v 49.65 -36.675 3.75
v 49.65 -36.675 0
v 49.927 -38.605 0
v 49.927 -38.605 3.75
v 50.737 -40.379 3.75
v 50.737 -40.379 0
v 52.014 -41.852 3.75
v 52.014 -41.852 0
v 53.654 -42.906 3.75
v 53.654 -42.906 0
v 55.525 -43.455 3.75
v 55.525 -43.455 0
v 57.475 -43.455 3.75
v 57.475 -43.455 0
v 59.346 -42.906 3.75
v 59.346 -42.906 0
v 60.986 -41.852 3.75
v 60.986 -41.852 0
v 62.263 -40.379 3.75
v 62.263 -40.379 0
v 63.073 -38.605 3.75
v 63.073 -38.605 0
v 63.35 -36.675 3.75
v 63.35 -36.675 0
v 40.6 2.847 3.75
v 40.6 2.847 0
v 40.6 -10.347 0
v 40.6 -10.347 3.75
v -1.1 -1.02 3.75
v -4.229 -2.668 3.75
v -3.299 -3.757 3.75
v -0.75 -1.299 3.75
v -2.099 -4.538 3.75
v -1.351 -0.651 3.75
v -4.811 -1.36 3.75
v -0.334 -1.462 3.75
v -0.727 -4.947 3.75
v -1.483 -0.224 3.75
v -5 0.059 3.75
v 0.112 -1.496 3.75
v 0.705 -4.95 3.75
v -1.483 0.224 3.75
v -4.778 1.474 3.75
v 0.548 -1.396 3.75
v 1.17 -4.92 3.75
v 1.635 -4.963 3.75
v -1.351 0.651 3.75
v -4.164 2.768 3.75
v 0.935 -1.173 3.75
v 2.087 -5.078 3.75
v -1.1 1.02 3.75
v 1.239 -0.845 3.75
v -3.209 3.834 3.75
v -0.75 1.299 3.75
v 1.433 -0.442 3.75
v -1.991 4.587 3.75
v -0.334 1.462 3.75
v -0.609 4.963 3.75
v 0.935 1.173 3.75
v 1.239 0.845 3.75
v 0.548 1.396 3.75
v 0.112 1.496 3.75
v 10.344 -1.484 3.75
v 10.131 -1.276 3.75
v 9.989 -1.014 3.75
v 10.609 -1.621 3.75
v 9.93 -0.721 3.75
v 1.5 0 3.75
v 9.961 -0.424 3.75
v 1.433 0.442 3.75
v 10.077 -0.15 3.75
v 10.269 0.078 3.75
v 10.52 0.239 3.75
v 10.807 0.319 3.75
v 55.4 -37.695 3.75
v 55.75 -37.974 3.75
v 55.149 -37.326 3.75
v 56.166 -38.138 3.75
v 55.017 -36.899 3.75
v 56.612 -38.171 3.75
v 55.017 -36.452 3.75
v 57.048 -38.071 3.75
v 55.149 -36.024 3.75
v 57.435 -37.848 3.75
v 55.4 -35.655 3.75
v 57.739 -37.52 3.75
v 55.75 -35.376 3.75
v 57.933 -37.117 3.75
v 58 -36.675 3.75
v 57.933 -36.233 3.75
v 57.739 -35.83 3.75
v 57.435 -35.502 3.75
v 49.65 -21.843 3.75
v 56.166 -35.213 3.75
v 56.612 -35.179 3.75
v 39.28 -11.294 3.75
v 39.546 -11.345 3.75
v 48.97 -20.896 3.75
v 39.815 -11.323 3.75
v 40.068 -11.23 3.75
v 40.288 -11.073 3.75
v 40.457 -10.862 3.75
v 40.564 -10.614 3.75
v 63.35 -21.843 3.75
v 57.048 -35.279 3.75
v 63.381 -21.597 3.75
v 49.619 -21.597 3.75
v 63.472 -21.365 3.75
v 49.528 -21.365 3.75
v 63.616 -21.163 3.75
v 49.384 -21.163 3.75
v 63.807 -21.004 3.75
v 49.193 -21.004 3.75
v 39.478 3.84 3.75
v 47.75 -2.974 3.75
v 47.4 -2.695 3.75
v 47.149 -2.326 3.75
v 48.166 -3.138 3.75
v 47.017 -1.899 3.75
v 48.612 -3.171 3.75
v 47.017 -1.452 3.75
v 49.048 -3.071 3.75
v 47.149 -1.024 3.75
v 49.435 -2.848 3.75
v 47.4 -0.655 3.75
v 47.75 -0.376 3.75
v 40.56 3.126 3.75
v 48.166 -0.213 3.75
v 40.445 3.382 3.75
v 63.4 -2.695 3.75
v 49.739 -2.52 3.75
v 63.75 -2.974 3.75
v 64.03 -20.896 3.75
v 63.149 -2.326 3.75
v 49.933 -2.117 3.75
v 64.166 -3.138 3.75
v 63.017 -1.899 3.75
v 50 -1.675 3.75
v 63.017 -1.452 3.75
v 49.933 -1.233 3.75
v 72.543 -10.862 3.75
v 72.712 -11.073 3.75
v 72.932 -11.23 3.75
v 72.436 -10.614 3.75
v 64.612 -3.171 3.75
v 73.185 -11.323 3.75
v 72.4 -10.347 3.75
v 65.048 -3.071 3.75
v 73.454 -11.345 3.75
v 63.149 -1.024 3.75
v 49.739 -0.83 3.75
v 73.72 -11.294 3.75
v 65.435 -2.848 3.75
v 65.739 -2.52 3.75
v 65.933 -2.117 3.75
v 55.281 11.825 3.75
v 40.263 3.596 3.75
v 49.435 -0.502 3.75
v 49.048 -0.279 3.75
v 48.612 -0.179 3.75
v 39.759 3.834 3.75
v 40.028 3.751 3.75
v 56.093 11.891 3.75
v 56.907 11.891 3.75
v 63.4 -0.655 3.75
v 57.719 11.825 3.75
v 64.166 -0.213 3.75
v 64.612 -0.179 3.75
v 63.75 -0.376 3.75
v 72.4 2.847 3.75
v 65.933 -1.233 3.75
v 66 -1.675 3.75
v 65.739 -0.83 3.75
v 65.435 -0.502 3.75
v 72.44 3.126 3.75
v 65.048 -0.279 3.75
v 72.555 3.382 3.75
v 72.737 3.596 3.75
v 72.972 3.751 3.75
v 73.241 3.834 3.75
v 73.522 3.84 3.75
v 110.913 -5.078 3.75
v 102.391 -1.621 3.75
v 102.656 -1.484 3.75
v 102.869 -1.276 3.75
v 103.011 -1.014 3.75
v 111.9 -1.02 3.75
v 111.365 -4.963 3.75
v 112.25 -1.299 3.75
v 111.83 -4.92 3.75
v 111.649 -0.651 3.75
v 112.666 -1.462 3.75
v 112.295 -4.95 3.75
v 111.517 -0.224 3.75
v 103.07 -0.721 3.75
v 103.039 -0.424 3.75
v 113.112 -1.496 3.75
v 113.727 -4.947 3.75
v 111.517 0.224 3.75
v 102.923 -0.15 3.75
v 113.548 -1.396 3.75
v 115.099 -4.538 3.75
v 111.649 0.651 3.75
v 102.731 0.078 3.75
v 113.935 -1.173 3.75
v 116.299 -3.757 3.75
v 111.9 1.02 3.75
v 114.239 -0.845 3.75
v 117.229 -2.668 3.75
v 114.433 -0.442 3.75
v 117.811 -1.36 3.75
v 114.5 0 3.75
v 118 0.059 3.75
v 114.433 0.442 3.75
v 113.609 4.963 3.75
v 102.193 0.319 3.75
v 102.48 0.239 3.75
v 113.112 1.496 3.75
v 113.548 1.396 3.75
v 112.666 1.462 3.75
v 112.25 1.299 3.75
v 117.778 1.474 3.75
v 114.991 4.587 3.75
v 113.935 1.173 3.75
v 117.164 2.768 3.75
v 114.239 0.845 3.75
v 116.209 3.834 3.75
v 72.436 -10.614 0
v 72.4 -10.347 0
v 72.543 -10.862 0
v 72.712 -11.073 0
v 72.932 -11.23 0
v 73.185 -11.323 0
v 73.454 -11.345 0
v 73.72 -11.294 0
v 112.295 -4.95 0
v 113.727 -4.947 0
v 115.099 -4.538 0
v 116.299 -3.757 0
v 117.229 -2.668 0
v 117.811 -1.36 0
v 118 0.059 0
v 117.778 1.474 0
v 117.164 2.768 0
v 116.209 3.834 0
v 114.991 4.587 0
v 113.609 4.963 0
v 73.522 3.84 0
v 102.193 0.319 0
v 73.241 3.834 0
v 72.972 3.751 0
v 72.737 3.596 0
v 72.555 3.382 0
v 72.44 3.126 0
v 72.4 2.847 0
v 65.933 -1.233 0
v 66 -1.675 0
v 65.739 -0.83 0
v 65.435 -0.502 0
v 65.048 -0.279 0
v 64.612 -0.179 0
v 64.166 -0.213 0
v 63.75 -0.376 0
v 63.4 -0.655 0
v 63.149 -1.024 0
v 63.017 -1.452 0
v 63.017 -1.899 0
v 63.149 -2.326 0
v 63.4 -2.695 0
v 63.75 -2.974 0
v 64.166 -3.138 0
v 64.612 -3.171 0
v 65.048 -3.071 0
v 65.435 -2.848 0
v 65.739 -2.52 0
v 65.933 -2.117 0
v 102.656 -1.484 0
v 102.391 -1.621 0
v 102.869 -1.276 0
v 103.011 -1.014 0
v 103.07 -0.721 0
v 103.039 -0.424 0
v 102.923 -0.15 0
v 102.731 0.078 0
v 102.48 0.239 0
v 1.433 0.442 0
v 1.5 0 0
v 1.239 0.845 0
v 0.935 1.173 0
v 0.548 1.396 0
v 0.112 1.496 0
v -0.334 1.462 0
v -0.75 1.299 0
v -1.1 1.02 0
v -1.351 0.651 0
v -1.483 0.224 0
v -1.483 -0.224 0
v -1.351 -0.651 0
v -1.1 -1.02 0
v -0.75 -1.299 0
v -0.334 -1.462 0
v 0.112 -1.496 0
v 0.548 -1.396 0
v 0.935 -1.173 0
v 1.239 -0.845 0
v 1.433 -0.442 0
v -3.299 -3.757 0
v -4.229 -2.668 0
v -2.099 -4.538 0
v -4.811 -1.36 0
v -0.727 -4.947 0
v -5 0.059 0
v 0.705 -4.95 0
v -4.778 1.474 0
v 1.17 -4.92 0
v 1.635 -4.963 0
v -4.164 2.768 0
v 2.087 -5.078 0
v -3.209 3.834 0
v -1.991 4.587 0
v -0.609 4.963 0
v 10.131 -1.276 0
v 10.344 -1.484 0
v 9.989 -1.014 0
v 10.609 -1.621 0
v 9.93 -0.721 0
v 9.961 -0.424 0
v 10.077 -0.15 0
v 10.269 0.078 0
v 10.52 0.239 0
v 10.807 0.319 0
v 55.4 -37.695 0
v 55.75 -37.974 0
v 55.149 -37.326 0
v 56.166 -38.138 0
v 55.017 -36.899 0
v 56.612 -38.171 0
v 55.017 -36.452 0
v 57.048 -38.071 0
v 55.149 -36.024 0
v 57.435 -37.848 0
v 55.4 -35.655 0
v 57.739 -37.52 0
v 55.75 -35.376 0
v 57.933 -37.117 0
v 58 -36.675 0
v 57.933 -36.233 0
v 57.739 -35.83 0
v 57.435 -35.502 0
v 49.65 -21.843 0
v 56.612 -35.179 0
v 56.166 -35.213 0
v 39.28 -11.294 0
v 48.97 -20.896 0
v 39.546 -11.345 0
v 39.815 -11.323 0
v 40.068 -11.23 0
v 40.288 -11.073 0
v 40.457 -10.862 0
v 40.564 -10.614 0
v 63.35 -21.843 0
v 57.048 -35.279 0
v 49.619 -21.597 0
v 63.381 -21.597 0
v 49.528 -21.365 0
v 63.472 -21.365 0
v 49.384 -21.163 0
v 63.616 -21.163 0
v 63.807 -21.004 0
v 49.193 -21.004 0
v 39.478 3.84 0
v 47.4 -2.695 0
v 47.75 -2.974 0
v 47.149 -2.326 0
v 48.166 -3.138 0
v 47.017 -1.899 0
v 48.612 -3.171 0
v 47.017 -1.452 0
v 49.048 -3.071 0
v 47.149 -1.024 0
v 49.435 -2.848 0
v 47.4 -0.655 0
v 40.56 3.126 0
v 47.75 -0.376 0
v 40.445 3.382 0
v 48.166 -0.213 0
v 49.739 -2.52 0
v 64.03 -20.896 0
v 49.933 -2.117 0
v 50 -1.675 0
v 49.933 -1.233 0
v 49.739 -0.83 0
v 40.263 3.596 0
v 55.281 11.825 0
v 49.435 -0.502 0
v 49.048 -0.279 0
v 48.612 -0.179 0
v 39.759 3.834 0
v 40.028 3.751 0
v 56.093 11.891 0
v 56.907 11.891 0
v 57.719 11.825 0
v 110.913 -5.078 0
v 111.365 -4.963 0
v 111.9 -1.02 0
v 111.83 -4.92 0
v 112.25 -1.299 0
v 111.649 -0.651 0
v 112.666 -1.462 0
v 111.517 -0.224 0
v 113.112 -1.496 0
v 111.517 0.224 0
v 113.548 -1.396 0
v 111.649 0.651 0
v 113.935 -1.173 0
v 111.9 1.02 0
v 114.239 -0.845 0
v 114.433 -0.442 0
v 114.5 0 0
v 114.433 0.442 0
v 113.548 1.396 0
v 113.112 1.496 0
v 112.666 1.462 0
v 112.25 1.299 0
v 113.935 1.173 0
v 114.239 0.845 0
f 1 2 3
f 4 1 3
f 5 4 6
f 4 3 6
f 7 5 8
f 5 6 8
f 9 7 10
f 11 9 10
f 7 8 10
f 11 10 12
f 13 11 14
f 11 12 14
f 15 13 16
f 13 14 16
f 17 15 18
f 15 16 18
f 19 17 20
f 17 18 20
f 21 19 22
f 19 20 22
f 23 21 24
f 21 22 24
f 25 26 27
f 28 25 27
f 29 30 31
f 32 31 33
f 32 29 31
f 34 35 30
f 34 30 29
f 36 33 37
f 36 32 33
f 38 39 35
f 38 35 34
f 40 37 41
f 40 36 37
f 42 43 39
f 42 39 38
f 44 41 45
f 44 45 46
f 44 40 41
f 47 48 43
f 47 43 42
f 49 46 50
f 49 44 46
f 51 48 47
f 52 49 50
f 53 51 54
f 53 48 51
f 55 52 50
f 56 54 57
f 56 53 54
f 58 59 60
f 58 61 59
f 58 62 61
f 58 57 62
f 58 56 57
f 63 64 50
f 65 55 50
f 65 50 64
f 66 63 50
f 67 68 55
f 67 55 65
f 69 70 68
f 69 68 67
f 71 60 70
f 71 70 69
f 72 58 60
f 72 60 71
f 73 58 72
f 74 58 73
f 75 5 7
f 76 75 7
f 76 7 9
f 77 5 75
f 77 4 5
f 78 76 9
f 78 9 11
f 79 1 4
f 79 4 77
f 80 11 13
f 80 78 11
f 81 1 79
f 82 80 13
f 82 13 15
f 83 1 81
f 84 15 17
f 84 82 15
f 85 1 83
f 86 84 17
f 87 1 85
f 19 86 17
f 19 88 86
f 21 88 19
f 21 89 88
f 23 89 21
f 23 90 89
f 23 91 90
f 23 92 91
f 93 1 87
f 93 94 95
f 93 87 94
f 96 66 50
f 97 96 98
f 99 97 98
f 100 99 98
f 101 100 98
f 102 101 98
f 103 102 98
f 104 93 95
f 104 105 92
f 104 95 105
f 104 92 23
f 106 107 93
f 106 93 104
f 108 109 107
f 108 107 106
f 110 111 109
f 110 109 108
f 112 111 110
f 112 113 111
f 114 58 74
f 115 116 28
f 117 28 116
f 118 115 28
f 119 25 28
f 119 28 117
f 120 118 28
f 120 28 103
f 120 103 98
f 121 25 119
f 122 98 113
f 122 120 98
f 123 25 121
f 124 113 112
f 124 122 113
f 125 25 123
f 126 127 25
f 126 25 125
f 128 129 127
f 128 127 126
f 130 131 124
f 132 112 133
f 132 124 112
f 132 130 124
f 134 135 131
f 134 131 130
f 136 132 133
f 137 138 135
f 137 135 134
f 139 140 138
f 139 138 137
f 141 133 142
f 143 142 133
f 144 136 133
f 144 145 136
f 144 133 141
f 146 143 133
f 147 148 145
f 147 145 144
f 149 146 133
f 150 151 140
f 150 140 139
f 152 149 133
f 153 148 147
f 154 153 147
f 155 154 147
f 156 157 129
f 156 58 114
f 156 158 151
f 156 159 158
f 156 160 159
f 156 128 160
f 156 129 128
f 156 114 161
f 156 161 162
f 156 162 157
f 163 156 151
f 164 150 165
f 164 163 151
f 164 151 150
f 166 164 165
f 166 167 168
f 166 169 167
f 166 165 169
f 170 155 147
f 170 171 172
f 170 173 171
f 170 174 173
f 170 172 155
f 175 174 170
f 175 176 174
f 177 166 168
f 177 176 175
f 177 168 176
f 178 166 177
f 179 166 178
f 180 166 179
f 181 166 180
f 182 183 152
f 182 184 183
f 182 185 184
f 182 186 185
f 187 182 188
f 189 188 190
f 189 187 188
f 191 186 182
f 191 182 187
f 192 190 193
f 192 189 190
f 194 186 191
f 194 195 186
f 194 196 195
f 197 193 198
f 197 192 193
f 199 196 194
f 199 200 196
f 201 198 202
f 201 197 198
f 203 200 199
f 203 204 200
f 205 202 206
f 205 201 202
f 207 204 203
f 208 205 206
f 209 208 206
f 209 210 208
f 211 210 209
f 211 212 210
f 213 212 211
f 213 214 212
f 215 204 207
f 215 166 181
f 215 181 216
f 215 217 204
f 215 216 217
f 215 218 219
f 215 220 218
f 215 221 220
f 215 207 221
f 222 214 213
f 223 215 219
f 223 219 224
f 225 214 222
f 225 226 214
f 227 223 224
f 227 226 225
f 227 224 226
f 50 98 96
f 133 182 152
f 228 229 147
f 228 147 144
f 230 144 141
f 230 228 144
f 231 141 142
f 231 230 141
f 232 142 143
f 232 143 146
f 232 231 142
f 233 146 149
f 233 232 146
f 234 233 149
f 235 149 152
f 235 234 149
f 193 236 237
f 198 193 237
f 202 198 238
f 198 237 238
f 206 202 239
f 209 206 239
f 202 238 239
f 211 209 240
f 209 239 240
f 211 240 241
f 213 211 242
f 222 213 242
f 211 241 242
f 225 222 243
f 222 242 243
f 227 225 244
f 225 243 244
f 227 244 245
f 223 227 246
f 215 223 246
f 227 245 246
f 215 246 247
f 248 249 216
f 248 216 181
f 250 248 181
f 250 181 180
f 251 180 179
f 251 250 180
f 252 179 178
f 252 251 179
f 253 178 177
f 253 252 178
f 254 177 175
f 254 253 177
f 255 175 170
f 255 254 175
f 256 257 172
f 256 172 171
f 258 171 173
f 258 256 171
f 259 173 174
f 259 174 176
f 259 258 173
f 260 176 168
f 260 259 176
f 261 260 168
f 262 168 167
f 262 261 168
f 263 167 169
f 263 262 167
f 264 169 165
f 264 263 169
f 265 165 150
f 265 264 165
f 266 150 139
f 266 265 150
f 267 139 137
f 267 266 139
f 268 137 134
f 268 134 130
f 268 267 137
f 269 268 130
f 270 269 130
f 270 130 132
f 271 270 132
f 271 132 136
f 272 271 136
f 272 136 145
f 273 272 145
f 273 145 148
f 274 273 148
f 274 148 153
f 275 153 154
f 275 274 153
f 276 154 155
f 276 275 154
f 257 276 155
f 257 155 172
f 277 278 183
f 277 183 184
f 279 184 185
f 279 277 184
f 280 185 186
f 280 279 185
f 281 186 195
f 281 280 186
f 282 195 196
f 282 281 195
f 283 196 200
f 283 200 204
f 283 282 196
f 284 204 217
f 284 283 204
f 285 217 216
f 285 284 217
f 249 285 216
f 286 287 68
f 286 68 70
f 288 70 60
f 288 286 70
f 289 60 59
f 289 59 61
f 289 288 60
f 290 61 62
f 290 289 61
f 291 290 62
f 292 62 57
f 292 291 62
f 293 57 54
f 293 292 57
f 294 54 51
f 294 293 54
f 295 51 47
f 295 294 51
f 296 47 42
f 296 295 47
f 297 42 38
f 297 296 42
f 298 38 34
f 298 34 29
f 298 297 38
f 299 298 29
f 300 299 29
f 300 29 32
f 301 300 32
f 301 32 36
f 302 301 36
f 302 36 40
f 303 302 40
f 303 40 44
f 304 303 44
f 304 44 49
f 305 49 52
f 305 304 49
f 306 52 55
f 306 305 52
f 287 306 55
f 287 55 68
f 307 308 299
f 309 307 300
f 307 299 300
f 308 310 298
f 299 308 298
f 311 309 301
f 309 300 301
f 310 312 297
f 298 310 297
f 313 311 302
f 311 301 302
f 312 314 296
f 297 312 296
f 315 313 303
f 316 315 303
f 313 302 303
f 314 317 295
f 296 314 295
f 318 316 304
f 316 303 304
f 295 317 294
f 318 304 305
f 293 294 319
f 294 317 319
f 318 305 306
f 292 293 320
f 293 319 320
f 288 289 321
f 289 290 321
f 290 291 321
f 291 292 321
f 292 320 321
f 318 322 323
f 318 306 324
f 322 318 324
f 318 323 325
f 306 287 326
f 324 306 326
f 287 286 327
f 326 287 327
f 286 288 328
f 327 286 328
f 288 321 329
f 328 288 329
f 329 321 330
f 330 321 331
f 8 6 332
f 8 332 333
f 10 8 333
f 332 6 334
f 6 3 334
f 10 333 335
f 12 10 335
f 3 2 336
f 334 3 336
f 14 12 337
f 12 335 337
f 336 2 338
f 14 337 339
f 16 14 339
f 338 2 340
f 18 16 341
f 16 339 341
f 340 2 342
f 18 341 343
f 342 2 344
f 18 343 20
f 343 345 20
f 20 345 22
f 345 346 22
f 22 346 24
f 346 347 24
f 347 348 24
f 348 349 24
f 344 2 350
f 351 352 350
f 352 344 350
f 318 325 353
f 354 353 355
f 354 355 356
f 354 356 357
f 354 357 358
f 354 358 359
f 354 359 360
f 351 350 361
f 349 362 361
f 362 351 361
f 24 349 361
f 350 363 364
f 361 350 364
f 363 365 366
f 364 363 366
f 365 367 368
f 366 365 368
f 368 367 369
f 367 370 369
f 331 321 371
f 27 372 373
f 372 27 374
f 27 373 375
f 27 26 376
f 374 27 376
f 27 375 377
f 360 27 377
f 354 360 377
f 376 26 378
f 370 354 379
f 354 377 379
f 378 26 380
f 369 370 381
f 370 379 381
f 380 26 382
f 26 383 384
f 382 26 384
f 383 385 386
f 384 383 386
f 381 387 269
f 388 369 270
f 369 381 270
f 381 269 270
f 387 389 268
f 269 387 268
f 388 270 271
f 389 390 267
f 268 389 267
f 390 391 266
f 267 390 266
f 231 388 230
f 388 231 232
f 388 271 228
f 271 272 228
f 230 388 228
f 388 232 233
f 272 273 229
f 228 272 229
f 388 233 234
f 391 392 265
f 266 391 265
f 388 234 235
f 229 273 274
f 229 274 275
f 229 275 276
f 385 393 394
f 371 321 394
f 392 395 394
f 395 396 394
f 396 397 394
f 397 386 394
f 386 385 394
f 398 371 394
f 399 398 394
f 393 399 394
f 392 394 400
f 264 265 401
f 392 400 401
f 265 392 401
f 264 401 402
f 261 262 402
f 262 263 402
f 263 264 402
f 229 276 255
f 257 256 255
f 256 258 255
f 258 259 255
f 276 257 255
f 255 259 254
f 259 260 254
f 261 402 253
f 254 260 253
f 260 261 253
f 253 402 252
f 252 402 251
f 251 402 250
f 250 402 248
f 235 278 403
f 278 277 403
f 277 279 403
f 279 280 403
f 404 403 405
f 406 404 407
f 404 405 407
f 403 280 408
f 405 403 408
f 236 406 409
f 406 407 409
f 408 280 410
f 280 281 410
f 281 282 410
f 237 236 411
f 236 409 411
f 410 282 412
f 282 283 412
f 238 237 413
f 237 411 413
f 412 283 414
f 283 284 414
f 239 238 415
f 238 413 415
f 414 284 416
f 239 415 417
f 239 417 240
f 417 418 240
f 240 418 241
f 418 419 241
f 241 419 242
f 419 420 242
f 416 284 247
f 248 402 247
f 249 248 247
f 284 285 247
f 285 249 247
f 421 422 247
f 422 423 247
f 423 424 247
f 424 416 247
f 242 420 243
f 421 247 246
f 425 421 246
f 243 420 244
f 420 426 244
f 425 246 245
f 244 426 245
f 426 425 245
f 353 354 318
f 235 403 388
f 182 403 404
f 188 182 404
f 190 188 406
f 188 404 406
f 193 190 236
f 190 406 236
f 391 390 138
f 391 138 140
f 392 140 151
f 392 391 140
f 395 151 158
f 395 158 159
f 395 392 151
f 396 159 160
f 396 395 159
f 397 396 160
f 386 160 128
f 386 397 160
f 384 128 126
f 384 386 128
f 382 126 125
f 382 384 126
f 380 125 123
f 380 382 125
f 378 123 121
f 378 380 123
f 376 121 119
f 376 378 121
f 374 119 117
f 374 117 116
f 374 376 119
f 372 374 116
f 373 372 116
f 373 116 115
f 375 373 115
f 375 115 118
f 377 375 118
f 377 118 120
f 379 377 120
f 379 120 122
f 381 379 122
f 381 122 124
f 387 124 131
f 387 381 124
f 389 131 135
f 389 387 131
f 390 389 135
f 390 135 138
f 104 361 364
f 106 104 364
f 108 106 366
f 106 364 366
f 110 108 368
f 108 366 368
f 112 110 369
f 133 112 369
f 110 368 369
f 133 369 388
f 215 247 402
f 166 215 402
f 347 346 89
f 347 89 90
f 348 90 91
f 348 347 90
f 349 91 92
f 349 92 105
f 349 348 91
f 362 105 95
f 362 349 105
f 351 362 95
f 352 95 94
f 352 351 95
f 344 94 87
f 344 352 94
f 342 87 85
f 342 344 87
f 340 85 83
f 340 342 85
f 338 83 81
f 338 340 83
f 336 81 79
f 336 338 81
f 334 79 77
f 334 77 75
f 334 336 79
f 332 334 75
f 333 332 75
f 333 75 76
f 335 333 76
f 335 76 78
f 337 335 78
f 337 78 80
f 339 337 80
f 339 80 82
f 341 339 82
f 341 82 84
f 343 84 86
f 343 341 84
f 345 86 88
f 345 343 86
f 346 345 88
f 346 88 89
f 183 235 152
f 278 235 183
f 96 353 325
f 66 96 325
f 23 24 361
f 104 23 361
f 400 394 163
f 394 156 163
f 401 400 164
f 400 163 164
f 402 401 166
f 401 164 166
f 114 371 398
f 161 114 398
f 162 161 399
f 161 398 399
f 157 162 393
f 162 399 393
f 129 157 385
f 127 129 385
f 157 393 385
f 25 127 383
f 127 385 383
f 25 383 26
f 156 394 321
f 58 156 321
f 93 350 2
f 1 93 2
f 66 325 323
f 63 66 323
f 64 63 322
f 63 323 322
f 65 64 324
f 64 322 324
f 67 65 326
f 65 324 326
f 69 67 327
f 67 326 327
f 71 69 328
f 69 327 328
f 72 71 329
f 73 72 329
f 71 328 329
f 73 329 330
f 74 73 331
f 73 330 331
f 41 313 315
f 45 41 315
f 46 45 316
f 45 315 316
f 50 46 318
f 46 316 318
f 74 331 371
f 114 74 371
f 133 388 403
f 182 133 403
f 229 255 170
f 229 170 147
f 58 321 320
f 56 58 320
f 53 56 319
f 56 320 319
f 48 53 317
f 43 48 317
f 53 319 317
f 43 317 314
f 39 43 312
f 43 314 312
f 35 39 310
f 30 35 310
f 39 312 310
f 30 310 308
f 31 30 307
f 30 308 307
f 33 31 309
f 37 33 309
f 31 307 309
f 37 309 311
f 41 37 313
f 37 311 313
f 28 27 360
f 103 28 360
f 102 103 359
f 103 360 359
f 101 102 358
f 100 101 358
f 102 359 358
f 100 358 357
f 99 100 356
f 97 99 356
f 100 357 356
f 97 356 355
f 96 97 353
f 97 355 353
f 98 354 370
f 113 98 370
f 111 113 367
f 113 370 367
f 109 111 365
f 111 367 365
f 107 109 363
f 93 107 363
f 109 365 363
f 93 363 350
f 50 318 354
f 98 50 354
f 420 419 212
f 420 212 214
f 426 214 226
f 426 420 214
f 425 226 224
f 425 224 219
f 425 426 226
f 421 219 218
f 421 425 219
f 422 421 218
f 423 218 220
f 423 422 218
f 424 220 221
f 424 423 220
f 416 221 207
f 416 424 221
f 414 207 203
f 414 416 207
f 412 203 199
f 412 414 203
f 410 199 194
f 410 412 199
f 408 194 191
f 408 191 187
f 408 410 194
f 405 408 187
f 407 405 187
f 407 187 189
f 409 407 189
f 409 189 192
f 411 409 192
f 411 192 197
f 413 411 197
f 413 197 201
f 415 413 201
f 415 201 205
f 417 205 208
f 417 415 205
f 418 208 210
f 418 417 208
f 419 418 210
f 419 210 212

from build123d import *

# Parameters (mm, degrees)
ESBO_O1_R                = 1.5
RESSALTO_EXTRUS_O1_DEPTH = 3.75
FILETE2_R                = 10


with BuildPart() as part:
    # Esboço1 → Ressalto-extrusão1 (new body)
    with BuildSketch(Plane.XY):
        with BuildLine():
            Line((56.5, 11.974876818), (-0.609346717, 4.962730758))
            ThreePointArc((-0.609346717, 4.962730758), (-4.956620044, -0.657204491), (0.705001075, -4.950047827))
            ThreePointArc((0.705001075, -4.950047827), (1.403511249, -4.932754227), (2.087076087, -5.077511421))
            Line((2.087076087, -5.077511421), (48.969691456, -20.895588778))
            ThreePointArc((48.969691456, -20.895588778), (49.462308887, -21.259883017), (49.65, -21.843110478))
            Line((49.65, -21.843110478), (49.65, -36.675123182))
            ThreePointArc((49.65, -36.675123182), (56.5, -43.525123182), (63.35, -36.675123182))
            Line((63.35, -36.675123182), (63.35, -21.843110478))
            ThreePointArc((63.35, -21.843110478), (63.537691113, -21.259883017), (64.030308544, -20.895588778))
            Line((64.030308544, -20.895588778), (110.912923913, -5.077511421))
            ThreePointArc((110.912923913, -5.077511421), (111.596488751, -4.932754227), (112.294998925, -4.950047827))
            ThreePointArc((112.294998925, -4.950047827), (117.956620044, -0.657204491), (113.609346717, 4.962730758))
            Line((113.609346717, 4.962730758), (56.5, 11.974876818))
        make_face()
        Circle(ESBO_O1_R, mode=Mode.SUBTRACT)
        with Locations((113, 0)):
            Circle(ESBO_O1_R, mode=Mode.SUBTRACT)
        with Locations((48.5, -1.675123182)):
            Circle(ESBO_O1_R, mode=Mode.SUBTRACT)
        with Locations((64.5, -1.675123182)):
            Circle(ESBO_O1_R, mode=Mode.SUBTRACT)
        with Locations((56.5, -36.675123182)):
            Circle(ESBO_O1_R, mode=Mode.SUBTRACT)
        with BuildLine():
            Line((39.280308544, -11.294106381), (10.609409181, -1.620616529))
            ThreePointArc((10.609409181, -1.620616529), (9.93425904, -0.571654218), (10.807231293, 0.319451323))
            Line((10.807231293, 0.319451323), (39.478130657, 3.839795112))
            ThreePointArc((39.478130657, 3.839795112), (40.262620048, 3.596204682), (40.6, 2.847248961))
            Line((40.6, 2.847248961), (40.6, -10.346584681))
            ThreePointArc((40.6, -10.346584681), (40.183227462, -11.158893568), (39.280308544, -11.294106381))
        make_face(mode=Mode.SUBTRACT)
        with BuildLine():
            Line((73.719691456, -11.294106381), (102.390590819, -1.620616529))
            ThreePointArc((102.390590819, -1.620616529), (103.06574096, -0.571654218), (102.192768707, 0.319451323))
            Line((102.192768707, 0.319451323), (73.521869343, 3.839795112))
            ThreePointArc((73.521869343, 3.839795112), (72.737379952, 3.596204682), (72.4, 2.847248961))
            Line((72.4, 2.847248961), (72.4, -10.346584681))
            ThreePointArc((72.4, -10.346584681), (72.816772538, -11.158893568), (73.719691456, -11.294106381))
        make_face(mode=Mode.SUBTRACT)
    extrude(amount=RESSALTO_EXTRUS_O1_DEPTH)

    # Filete2
    filete2_edges = [part.edges().sort_by_distance(p)[0] for p in [
        (56.5, 11.974876818, 1.875),
    ]]
    fillet(filete2_edges, radius=FILETE2_R)


solid = part.part
